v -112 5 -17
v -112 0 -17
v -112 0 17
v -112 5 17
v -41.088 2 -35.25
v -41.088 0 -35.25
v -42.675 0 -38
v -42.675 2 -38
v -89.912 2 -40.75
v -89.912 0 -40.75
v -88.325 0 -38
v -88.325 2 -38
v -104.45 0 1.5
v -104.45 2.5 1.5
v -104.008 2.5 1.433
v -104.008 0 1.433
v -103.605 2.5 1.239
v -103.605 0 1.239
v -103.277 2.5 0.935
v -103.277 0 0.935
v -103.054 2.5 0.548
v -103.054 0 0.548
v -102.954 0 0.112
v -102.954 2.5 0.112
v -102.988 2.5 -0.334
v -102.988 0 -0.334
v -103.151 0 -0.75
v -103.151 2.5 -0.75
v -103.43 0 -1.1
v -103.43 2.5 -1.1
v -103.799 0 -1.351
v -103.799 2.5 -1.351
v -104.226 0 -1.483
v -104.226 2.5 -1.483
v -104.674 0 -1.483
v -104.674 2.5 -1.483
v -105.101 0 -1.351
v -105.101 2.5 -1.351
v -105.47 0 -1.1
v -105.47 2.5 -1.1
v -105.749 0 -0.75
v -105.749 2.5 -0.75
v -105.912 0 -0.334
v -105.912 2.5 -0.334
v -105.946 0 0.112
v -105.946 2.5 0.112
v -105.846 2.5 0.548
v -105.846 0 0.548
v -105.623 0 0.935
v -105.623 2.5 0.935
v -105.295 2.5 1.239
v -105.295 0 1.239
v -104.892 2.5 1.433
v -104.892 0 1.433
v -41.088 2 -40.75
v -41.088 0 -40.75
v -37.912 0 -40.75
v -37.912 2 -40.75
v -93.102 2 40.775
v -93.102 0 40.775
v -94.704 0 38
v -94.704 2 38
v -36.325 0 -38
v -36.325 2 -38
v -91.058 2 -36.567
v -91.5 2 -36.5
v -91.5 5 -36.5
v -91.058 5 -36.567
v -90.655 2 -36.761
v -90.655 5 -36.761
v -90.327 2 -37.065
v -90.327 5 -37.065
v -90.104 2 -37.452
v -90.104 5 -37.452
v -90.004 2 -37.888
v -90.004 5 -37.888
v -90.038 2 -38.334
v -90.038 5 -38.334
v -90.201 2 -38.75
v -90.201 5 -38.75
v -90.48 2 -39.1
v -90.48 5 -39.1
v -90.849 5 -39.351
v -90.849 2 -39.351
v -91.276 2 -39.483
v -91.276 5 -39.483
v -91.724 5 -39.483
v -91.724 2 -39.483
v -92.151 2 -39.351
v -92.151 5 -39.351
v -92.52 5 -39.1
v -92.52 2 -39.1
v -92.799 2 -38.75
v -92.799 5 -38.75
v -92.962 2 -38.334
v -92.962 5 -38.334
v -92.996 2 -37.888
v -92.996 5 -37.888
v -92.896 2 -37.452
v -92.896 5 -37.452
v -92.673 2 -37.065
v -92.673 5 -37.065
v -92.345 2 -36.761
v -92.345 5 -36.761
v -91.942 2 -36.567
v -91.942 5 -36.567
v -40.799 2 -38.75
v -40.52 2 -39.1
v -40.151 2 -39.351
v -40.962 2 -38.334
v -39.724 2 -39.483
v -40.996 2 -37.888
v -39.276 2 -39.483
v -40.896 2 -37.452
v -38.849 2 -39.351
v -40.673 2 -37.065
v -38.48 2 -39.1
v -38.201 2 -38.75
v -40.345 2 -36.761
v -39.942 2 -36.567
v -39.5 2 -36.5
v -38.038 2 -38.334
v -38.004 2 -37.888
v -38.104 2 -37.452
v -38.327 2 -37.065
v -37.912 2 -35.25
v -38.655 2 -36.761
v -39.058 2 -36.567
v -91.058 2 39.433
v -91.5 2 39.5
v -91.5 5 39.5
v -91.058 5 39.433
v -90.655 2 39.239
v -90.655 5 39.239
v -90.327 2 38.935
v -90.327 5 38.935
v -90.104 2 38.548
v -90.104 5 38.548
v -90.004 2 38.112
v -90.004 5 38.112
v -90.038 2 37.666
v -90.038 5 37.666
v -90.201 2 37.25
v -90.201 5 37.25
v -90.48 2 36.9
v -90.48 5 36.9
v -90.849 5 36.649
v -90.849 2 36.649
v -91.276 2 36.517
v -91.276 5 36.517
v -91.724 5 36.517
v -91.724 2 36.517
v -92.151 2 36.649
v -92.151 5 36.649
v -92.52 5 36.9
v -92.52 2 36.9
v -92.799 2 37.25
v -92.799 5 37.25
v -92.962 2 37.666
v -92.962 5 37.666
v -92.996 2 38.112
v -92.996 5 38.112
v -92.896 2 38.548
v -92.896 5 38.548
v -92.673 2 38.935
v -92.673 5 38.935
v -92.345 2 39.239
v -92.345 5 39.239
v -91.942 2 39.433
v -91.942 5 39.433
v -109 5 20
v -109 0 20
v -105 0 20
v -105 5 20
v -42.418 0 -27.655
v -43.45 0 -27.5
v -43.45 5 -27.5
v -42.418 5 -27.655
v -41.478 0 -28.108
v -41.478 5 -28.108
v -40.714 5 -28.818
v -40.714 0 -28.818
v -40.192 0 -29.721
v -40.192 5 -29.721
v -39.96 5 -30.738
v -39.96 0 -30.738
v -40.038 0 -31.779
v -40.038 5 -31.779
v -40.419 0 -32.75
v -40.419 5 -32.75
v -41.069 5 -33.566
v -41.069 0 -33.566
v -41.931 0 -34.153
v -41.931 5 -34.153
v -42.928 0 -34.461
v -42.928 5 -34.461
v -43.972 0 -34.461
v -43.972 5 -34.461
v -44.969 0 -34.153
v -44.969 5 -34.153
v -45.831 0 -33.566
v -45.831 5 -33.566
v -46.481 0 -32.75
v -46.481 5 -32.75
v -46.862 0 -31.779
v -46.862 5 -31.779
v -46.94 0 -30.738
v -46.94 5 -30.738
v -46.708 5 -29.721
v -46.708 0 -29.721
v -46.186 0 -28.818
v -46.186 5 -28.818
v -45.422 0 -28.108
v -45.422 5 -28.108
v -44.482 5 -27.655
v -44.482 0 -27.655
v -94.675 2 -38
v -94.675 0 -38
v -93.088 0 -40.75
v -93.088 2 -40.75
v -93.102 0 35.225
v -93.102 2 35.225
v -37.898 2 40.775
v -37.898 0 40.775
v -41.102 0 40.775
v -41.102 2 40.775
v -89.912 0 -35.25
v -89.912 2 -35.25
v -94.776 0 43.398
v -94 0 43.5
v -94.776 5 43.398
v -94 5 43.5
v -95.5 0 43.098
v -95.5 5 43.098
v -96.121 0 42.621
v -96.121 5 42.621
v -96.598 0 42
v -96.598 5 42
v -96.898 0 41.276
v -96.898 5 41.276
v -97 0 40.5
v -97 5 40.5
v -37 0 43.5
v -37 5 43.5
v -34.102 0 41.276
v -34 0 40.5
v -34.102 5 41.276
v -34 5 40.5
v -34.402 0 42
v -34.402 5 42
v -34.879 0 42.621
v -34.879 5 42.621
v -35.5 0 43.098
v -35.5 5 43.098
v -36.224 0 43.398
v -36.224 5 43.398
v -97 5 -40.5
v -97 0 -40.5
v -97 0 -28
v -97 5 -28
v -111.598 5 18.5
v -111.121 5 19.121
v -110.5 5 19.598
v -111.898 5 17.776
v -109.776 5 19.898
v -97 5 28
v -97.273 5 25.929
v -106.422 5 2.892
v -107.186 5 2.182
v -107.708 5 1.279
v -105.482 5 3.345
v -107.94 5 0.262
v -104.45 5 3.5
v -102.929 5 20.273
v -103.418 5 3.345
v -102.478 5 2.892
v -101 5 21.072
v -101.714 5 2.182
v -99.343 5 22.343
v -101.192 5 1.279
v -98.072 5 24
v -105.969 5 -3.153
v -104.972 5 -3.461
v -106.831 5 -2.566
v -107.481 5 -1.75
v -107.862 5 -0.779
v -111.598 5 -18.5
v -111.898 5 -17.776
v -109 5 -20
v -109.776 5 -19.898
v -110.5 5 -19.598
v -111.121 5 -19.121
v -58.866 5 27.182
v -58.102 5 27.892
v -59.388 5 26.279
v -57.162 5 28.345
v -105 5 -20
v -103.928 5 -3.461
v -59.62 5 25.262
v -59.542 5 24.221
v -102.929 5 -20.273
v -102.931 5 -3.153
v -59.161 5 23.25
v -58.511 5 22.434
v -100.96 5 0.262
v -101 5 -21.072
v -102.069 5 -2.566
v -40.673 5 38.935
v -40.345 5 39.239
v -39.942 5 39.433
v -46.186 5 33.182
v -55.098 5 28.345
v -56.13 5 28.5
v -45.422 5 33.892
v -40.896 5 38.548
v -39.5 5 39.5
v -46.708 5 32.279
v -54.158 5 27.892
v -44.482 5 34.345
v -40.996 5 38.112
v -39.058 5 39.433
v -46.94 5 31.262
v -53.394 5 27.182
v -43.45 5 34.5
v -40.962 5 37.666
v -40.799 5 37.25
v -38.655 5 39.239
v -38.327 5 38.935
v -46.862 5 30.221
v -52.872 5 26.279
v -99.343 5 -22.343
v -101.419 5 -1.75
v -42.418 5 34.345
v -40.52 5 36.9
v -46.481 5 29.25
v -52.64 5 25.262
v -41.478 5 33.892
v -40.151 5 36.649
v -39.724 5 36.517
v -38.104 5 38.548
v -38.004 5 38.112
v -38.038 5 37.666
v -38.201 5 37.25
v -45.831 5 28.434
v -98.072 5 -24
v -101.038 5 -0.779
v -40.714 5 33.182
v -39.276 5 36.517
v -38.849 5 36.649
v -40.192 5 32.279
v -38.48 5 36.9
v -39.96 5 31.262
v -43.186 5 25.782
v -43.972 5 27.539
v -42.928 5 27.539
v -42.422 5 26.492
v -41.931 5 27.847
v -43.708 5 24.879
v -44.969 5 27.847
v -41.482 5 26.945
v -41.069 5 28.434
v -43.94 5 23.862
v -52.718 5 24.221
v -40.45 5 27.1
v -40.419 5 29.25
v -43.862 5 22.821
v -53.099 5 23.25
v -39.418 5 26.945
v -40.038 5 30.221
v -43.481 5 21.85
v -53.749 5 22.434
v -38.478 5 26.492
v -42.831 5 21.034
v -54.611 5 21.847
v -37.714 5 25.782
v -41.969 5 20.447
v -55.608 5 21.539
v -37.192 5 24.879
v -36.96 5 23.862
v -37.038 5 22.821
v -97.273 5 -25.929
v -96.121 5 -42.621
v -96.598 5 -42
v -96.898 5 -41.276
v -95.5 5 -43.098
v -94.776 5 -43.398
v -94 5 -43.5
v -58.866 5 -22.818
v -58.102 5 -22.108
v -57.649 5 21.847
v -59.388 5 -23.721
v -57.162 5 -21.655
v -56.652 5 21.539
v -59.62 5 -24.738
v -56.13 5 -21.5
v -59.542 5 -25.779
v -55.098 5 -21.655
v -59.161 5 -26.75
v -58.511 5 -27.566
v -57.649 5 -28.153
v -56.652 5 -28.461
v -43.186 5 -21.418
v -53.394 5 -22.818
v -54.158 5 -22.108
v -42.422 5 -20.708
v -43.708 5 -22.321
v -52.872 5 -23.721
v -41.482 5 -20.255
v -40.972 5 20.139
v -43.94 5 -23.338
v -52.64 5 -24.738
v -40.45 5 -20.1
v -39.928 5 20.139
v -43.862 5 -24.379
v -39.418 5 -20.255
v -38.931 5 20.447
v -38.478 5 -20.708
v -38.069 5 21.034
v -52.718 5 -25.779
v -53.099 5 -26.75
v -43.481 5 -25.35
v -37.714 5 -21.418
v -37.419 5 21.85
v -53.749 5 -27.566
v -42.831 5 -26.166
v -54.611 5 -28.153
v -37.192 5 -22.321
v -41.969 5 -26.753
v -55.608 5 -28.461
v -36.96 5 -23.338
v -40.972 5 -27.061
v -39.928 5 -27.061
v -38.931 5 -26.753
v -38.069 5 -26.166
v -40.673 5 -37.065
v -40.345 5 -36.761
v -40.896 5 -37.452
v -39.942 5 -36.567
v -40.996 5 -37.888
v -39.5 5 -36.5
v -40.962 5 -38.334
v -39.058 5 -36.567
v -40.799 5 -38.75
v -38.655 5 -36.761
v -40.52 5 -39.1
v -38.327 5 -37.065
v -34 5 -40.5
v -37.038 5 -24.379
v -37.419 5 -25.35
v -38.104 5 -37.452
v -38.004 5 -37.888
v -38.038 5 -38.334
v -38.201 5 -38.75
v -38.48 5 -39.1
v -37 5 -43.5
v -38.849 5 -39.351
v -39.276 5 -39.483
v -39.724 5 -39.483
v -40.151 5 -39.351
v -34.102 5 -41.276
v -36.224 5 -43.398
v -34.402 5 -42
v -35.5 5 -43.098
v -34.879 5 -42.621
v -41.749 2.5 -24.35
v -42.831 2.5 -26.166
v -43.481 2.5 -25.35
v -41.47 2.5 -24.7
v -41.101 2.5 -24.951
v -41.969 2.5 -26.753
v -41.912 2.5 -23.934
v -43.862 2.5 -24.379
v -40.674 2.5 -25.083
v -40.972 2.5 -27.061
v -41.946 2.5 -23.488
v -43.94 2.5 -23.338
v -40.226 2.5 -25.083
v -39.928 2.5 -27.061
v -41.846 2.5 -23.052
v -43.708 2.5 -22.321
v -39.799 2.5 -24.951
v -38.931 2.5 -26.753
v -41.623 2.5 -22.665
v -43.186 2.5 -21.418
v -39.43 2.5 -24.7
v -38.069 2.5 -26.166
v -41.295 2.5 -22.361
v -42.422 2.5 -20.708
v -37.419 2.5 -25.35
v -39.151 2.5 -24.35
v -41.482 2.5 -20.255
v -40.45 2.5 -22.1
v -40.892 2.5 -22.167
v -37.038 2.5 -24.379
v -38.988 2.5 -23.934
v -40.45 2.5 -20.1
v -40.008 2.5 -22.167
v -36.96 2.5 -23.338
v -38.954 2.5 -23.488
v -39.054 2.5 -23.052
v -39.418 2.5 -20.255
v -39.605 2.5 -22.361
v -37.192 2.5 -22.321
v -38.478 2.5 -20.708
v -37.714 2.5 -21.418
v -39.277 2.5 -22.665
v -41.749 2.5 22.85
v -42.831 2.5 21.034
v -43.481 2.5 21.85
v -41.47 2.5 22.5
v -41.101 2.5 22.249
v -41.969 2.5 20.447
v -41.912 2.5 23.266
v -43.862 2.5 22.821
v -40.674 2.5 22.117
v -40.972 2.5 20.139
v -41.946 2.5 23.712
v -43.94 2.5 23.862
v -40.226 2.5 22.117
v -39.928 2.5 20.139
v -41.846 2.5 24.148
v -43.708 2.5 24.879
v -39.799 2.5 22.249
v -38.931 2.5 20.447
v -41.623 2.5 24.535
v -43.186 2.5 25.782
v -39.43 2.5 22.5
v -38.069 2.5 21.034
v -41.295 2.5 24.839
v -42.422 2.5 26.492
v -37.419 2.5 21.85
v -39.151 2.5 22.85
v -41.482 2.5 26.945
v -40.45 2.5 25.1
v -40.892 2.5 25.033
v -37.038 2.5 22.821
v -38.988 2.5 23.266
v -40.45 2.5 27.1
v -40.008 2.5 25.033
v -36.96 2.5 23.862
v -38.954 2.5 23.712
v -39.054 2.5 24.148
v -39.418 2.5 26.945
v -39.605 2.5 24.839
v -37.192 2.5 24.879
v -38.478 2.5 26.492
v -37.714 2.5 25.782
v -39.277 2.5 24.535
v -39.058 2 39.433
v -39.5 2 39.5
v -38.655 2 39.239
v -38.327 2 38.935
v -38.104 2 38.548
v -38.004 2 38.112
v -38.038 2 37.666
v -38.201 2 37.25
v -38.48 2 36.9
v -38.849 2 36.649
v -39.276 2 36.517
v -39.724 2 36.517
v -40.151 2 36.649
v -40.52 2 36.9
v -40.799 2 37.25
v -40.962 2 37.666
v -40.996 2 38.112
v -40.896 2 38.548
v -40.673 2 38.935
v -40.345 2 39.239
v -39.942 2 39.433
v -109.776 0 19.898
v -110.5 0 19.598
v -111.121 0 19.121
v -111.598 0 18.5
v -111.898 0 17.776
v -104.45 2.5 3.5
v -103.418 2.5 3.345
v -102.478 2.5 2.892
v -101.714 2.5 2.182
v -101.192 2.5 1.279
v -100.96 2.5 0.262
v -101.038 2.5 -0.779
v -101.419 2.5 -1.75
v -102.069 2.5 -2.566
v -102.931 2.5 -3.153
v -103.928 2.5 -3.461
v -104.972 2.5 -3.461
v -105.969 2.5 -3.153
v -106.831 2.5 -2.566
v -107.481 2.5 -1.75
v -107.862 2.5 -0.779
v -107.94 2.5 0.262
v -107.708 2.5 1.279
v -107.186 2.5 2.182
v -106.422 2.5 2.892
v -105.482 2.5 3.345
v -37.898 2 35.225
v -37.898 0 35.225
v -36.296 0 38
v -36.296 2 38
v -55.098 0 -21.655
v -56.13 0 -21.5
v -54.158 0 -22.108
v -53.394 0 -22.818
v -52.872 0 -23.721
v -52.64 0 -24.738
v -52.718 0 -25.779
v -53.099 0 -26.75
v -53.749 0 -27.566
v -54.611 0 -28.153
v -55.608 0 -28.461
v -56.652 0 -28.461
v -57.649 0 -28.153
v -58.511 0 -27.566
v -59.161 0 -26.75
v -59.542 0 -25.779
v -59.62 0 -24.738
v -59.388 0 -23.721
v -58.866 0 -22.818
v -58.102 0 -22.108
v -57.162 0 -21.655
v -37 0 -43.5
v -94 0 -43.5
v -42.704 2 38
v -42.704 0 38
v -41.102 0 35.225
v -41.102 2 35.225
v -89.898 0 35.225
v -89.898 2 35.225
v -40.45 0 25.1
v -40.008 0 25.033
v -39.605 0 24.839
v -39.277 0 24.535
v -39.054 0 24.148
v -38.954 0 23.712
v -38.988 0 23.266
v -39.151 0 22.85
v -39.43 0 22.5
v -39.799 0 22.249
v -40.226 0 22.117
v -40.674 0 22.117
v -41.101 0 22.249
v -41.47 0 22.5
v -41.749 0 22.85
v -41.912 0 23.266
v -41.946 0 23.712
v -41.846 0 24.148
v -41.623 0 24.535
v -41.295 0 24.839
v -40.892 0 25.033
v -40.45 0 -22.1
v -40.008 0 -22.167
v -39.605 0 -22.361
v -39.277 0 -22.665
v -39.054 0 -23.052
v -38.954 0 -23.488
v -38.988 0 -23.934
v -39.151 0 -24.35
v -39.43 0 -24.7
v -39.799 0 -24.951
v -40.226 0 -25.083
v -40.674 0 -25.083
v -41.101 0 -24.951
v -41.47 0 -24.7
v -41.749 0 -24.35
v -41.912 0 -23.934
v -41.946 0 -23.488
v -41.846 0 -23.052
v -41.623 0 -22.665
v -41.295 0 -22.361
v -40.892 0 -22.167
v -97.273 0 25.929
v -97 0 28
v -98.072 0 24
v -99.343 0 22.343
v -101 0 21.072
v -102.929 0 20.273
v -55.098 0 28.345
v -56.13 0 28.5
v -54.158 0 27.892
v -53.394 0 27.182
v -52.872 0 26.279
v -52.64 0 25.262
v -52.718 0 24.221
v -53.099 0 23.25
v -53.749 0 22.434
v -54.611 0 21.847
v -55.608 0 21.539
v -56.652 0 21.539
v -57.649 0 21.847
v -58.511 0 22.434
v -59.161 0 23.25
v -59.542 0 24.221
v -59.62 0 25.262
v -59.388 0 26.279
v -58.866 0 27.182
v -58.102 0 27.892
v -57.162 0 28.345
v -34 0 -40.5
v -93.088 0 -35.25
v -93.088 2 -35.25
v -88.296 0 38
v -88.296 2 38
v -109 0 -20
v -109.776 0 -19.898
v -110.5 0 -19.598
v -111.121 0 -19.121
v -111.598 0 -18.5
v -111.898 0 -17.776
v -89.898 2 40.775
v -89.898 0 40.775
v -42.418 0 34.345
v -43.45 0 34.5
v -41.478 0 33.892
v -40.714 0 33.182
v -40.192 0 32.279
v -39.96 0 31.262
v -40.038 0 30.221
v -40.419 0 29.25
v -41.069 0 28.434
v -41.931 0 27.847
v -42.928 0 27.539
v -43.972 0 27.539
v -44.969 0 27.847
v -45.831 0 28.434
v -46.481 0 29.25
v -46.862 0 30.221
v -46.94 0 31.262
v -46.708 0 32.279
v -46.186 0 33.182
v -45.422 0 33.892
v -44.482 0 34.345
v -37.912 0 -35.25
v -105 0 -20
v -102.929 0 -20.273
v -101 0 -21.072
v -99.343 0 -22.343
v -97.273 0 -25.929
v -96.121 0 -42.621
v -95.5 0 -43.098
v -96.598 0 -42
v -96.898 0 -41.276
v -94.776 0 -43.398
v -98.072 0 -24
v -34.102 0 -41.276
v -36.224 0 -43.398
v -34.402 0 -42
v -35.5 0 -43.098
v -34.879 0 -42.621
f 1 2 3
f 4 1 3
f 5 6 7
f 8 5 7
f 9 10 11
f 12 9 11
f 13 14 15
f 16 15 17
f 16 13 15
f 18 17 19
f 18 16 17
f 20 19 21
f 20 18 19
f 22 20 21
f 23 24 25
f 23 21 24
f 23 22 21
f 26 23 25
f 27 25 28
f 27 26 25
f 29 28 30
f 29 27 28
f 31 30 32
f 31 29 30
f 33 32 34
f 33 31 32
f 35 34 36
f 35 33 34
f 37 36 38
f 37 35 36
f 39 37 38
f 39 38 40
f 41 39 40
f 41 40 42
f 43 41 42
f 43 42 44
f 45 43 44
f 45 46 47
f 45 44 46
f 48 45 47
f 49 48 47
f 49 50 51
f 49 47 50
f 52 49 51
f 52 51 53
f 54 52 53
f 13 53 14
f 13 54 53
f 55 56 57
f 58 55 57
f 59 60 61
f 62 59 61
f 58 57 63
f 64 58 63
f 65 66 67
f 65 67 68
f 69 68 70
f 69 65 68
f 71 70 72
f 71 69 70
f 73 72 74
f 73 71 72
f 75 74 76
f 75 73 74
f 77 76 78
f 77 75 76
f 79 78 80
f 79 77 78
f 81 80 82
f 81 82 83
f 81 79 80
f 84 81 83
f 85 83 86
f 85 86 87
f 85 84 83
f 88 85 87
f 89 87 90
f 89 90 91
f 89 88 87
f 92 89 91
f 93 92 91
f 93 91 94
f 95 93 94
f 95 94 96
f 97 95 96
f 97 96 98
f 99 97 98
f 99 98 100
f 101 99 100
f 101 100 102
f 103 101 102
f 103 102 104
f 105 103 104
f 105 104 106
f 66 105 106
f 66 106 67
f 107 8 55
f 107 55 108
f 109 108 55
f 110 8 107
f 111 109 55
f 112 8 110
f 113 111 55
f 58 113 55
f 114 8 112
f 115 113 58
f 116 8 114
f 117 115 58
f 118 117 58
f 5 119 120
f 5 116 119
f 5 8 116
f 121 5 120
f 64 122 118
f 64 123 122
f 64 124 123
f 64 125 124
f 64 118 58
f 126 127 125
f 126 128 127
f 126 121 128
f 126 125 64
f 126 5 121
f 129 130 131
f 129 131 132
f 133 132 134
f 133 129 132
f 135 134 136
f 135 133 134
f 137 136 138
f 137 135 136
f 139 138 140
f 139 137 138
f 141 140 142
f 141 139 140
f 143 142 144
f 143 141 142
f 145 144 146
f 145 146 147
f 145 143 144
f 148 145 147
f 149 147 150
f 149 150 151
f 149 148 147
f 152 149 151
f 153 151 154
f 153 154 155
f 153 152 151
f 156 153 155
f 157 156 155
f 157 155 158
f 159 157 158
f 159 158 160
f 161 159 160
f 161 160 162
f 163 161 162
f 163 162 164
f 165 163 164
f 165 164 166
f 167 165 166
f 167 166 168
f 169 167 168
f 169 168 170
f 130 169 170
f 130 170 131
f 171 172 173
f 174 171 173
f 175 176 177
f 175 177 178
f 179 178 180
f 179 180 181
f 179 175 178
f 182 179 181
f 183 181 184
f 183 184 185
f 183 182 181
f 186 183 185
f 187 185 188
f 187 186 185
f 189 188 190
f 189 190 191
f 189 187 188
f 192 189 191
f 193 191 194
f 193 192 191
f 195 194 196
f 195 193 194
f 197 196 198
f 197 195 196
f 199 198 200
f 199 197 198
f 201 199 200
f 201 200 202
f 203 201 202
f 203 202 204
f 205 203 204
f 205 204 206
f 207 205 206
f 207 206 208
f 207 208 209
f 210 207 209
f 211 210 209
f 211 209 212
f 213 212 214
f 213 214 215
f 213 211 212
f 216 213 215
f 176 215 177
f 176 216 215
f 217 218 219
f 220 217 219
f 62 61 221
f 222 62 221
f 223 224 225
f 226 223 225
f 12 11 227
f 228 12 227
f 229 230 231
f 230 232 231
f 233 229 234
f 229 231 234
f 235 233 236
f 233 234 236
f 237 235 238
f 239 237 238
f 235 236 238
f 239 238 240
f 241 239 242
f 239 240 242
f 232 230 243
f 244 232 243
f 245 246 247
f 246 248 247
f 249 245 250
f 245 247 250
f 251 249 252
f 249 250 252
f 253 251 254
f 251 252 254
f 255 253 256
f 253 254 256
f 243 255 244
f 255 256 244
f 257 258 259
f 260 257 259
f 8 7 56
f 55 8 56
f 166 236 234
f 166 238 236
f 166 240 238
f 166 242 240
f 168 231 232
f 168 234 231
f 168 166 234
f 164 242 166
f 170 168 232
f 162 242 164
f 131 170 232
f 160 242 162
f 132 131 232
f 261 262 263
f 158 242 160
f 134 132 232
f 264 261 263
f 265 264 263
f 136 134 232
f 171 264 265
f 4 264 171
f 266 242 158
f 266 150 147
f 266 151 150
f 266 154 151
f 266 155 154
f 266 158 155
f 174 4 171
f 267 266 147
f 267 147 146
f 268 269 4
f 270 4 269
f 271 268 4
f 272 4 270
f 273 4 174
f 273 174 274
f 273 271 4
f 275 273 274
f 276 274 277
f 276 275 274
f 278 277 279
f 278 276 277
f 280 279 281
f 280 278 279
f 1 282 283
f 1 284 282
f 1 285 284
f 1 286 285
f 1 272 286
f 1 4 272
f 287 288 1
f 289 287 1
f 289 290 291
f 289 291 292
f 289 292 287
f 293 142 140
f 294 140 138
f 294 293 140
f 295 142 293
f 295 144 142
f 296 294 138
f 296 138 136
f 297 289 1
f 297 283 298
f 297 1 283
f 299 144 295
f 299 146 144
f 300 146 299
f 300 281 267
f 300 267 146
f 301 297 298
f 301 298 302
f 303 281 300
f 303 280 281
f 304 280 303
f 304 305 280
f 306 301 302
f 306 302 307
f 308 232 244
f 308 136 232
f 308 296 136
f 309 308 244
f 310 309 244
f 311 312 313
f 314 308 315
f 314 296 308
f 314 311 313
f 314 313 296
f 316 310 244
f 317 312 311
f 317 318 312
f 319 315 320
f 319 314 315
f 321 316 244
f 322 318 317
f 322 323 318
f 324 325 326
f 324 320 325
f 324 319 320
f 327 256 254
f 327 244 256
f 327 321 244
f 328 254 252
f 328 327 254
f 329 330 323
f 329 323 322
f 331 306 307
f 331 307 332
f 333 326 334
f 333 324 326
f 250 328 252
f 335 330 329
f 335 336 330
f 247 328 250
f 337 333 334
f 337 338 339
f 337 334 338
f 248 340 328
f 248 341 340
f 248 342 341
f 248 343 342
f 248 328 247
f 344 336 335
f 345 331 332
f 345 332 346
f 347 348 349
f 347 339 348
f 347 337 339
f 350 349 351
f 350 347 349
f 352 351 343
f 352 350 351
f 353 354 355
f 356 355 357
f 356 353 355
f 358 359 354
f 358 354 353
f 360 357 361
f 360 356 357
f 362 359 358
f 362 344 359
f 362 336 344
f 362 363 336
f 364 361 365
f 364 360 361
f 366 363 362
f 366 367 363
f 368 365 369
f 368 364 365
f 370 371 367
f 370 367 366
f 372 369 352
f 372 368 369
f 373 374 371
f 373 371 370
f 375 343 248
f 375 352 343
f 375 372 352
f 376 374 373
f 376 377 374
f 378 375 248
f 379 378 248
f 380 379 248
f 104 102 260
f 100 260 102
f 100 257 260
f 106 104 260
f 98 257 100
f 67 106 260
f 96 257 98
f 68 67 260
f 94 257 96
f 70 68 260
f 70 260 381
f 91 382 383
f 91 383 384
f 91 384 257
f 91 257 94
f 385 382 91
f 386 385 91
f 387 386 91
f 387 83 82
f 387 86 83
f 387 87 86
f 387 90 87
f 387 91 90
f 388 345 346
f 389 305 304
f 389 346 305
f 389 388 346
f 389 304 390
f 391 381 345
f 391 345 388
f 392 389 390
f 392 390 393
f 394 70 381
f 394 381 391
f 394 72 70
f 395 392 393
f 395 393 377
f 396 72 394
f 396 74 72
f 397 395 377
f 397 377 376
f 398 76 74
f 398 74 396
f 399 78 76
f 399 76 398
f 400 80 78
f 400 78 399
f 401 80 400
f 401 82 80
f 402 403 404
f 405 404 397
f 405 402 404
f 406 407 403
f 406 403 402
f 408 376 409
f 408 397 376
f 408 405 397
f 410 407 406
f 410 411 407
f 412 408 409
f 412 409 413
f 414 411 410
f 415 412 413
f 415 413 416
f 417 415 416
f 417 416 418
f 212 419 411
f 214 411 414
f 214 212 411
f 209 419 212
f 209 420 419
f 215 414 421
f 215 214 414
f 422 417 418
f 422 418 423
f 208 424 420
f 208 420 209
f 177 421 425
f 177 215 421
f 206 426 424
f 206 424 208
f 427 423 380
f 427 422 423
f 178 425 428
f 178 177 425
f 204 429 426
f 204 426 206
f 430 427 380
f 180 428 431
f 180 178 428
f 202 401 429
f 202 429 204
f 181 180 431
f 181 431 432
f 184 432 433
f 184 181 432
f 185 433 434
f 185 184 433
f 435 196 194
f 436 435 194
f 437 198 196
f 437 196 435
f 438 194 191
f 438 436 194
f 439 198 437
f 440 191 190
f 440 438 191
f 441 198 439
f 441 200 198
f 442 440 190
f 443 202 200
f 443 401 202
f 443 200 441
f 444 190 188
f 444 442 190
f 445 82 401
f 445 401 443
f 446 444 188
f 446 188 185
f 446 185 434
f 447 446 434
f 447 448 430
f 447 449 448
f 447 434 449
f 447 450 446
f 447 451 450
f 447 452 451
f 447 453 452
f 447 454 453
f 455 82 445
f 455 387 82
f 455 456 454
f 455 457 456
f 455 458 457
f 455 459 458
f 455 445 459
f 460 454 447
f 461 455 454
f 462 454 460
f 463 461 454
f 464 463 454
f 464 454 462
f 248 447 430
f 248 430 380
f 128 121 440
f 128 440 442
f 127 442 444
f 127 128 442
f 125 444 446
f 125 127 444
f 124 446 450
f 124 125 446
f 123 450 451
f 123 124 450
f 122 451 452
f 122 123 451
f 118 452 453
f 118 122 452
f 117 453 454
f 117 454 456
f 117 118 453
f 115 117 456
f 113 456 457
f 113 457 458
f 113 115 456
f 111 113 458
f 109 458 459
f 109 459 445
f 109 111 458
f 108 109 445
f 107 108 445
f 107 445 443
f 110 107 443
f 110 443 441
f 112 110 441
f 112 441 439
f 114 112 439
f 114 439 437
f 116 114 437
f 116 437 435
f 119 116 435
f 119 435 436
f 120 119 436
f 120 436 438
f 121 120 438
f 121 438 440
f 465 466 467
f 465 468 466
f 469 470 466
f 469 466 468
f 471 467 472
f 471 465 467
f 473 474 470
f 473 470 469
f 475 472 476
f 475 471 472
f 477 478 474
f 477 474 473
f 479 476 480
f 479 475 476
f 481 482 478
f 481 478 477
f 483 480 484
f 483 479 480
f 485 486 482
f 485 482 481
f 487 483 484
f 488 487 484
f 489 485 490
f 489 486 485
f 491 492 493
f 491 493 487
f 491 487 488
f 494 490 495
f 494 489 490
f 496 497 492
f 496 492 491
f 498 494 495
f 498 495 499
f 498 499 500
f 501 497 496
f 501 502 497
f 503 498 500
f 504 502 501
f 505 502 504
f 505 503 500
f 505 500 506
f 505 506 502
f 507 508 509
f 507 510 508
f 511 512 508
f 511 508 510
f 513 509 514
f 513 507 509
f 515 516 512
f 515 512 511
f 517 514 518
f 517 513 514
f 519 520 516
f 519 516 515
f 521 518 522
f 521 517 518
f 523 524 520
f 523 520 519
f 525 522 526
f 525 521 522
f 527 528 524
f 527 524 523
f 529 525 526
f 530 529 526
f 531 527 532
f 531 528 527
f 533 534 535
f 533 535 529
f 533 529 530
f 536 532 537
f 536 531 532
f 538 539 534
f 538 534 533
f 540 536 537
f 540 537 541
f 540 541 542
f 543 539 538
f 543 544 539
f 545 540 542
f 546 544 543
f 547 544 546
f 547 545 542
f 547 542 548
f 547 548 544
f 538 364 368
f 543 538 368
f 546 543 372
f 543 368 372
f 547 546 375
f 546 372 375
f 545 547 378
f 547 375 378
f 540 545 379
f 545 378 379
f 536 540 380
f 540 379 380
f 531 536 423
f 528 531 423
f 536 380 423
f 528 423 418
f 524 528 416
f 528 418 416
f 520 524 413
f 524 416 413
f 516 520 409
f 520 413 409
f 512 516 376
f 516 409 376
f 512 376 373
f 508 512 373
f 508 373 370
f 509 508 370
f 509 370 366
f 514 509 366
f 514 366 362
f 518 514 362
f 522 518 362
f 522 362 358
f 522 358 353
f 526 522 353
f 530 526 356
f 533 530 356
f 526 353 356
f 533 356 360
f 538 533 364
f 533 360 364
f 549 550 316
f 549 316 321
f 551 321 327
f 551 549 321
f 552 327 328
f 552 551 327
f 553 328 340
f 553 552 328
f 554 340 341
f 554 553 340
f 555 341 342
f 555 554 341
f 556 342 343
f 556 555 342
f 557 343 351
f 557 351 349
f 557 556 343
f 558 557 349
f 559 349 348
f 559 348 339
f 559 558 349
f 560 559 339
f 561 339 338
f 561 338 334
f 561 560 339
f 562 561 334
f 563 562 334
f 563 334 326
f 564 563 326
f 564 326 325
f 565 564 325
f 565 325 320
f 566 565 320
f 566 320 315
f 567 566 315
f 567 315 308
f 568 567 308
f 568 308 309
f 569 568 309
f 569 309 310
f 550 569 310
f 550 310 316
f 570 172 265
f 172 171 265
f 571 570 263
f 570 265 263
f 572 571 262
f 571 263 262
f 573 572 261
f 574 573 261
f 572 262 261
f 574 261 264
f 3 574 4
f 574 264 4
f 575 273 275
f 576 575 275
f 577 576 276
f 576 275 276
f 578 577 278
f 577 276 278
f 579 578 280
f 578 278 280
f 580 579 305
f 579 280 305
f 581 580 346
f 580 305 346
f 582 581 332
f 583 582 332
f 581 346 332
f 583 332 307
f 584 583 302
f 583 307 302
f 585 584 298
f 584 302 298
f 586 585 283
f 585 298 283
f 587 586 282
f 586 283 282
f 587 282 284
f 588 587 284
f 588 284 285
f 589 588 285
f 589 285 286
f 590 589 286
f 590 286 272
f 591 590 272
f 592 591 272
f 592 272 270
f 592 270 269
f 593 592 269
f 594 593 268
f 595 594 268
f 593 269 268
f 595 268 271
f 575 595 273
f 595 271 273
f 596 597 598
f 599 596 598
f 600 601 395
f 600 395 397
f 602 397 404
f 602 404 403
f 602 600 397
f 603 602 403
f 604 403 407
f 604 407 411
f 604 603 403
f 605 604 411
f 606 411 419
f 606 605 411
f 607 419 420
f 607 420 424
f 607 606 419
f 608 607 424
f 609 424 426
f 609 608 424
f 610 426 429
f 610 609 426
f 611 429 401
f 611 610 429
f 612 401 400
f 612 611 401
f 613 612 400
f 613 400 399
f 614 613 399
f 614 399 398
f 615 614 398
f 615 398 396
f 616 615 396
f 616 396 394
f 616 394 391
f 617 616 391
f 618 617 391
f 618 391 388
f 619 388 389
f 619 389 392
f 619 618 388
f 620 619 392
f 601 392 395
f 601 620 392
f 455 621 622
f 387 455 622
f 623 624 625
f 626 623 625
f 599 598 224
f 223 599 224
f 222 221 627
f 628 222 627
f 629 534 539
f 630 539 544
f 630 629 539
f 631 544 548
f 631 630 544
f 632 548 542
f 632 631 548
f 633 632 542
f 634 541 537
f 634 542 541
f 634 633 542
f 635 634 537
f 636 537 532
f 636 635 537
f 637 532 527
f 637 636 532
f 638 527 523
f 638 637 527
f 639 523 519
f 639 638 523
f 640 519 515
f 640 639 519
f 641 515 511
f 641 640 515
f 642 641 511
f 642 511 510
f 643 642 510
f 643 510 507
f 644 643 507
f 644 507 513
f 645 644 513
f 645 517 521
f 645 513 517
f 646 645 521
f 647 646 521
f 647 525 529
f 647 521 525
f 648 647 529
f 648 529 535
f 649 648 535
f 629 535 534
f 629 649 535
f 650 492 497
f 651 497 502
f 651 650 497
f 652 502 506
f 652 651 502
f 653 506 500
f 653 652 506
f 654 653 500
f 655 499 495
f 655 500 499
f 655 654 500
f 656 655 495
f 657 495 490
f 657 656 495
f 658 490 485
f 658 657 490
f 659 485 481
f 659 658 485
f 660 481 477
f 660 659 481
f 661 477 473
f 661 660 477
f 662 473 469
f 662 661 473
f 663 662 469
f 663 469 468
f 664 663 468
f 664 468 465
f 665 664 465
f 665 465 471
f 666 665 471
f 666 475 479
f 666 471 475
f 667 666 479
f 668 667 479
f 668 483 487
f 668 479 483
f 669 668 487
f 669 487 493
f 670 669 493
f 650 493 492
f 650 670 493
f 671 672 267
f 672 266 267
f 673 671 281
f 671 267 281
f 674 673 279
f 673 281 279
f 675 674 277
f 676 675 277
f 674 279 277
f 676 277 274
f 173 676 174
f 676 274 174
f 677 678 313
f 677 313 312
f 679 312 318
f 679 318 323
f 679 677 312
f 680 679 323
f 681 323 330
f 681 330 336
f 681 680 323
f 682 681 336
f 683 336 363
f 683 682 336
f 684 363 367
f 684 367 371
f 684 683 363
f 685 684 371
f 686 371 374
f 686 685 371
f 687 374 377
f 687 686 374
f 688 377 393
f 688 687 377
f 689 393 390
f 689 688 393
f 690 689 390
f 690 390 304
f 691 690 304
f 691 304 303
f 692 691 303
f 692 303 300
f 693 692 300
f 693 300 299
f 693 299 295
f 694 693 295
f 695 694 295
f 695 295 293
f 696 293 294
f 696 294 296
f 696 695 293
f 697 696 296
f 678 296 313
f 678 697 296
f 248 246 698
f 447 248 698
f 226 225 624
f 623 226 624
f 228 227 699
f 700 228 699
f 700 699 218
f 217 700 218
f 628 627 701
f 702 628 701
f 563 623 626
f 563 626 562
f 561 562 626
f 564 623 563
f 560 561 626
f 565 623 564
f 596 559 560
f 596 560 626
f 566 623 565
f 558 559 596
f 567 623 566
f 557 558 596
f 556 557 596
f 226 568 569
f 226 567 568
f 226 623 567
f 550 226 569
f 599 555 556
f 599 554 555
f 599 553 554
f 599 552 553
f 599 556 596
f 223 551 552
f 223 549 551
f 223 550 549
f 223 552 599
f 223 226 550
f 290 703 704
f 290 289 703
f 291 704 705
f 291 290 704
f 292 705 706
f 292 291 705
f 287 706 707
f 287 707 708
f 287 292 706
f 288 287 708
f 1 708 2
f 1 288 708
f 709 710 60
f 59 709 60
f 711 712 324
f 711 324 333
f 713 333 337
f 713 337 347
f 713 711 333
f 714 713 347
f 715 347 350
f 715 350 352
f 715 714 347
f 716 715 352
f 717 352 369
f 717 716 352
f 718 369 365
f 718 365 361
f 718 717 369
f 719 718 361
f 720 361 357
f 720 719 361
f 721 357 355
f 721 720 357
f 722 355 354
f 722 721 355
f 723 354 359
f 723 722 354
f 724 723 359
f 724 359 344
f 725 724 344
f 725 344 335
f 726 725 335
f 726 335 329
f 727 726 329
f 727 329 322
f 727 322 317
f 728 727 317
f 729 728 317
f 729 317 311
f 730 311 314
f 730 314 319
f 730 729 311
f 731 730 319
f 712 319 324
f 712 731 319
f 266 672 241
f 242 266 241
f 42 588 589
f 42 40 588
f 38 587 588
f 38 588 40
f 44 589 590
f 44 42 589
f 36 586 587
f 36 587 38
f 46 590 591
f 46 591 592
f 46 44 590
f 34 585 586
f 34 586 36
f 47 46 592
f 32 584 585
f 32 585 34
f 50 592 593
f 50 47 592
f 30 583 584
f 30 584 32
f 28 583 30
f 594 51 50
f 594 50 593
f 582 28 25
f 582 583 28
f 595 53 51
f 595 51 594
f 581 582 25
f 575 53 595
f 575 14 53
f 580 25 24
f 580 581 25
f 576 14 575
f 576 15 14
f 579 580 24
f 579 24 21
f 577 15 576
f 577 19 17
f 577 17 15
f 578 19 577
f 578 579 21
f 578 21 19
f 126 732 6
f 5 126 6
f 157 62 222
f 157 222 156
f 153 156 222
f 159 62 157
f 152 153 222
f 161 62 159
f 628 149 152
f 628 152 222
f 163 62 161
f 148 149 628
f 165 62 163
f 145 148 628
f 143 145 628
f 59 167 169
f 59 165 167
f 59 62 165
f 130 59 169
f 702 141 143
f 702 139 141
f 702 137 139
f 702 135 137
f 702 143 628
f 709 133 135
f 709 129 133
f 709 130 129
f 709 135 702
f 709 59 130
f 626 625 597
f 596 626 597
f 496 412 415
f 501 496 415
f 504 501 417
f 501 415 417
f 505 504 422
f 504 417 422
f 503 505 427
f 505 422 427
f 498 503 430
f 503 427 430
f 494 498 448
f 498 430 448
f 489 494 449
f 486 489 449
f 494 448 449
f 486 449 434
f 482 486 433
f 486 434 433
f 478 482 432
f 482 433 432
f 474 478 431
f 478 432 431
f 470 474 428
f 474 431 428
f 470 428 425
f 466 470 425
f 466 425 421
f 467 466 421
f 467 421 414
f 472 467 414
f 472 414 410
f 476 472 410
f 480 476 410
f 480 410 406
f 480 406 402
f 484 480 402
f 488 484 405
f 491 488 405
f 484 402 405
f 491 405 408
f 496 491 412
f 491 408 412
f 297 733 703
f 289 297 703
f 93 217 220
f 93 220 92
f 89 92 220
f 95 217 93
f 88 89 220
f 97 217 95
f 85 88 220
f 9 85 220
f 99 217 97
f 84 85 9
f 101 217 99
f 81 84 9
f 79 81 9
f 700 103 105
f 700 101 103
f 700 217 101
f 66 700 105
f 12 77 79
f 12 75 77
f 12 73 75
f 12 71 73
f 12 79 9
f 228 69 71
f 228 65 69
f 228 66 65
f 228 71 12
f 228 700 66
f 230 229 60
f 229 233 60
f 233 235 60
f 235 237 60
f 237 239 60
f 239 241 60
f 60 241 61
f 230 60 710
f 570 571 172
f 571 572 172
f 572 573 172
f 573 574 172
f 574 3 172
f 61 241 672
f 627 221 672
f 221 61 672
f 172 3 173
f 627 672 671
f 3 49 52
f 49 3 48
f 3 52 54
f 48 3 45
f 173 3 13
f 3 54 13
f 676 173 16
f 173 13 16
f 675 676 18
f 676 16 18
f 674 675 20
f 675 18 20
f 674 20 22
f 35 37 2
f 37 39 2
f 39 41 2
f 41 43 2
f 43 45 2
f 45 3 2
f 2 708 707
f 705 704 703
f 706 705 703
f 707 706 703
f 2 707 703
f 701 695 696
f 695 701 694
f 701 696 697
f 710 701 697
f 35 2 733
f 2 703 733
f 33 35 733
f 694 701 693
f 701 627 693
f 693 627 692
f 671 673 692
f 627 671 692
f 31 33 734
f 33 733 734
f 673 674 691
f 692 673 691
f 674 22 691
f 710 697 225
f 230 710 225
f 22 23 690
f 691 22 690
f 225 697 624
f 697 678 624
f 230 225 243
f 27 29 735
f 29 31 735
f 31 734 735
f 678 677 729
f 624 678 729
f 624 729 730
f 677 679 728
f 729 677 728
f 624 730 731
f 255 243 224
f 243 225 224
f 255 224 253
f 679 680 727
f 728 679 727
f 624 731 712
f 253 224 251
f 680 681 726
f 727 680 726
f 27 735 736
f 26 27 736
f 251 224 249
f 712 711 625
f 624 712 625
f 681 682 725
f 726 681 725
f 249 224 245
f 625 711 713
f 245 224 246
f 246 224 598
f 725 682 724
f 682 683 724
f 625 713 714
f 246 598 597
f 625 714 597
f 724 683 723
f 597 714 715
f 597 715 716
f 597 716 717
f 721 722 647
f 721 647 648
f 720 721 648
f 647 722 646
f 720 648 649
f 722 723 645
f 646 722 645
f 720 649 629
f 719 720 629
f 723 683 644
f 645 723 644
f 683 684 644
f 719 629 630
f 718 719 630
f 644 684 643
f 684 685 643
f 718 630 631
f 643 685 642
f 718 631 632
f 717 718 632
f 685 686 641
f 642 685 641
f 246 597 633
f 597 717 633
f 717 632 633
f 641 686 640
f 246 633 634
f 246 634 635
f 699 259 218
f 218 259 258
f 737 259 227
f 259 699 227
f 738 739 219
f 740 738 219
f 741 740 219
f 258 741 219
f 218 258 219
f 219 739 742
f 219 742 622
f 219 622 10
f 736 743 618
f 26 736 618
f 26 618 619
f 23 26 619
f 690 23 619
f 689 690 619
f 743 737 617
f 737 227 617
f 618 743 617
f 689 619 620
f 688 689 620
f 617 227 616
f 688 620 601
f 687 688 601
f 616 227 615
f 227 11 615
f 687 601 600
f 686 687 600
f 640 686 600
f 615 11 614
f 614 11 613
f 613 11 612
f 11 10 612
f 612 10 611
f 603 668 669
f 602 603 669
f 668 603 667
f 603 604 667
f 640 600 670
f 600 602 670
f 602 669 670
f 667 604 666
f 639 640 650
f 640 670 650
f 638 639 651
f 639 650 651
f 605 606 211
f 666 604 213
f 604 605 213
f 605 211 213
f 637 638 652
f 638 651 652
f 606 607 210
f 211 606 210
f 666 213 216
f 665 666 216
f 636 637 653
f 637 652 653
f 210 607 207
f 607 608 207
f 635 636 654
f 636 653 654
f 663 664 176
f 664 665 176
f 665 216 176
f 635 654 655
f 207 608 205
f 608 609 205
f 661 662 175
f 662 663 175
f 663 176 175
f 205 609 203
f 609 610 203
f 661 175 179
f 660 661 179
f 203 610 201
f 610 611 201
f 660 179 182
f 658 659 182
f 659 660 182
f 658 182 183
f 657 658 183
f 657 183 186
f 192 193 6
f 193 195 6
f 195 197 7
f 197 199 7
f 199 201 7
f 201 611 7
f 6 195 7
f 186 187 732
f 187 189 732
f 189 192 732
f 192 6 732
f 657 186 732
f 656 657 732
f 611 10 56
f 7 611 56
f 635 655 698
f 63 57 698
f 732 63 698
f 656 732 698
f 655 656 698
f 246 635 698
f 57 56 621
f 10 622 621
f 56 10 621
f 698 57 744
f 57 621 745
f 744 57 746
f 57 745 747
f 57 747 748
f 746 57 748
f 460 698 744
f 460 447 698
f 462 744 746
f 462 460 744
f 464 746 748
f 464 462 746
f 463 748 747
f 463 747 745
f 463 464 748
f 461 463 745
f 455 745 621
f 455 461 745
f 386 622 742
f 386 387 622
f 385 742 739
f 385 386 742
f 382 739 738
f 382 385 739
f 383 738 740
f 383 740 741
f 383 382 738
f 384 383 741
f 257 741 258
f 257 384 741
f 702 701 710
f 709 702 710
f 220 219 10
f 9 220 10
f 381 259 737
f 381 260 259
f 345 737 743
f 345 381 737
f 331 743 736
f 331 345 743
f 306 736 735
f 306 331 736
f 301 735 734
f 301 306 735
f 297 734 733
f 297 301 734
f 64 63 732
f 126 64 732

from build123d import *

# Parameters (mm, degrees)
SKETCH1_R           = 1.5
SKETCH1_R_2         = 3.5
BOSS_EXTRUDE1_DEPTH = 5
FILLET1_R           = 3
FILLET2_R           = 8
SKETCH2_R           = 3.5
CUT_EXTRUDE1_DEPTH  = 2.5
CUT_EXTRUDE2_DEPTH  = 2


with BuildPart() as part:
    # Sketch1 → Boss-Extrude1 (new body)
    with BuildSketch(Plane(origin=(0, 0, 0), x_dir=(1, 0, 0), z_dir=(0, 1, 0))):
        Polygon((-34, -43.5), (-34, 43.5), (-97, 43.5), (-97, 20), (-112, 20), (-112, -20), (-97, -20), (-97, -43.5), align=None)
        with Locations(Location((-104.45, 0, 0), (0, 0, 270))):
            Circle(SKETCH1_R, mode=Mode.SUBTRACT)
        with Locations(Location((-43.45, 31, 0), (0, 0, 270))):
            Circle(SKETCH1_R_2, mode=Mode.SUBTRACT)
        with Locations(Location((-56.13, 25, 0), (0, 0, 270))):
            Circle(SKETCH1_R_2, mode=Mode.SUBTRACT)
        with Locations(Location((-40.45, 23.6, 0), (0, 0, 270))):
            Circle(SKETCH1_R, mode=Mode.SUBTRACT)
        with Locations(Location((-40.45, -23.6, 0), (0, 0, 270))):
            Circle(SKETCH1_R, mode=Mode.SUBTRACT)
        with Locations(Location((-56.13, -25, 0), (0, 0, 270))):
            Circle(SKETCH1_R_2, mode=Mode.SUBTRACT)
        with Locations(Location((-43.45, -31, 0), (0, 0, 270))):
            Circle(SKETCH1_R_2, mode=Mode.SUBTRACT)
        with Locations(Location((-39.5, 38, 0), (0, 0, 270))):
            Circle(SKETCH1_R, mode=Mode.SUBTRACT)
        with Locations(Location((-91.5, 38, 0), (0, 0, 270))):
            Circle(SKETCH1_R, mode=Mode.SUBTRACT)
        with Locations(Location((-91.5, -38, 0), (0, 0, 270))):
            Circle(SKETCH1_R, mode=Mode.SUBTRACT)
        with Locations(Location((-39.5, -38, 0), (0, 0, 270))):
            Circle(SKETCH1_R, mode=Mode.SUBTRACT)
    extrude(amount=BOSS_EXTRUDE1_DEPTH)

    # Fillet1
    fillet1_edges = [part.edges().sort_by_distance(p)[0] for p in [
        (-97, 2.5, 43.5),
        (-112, 2.5, 20),
        (-112, 2.5, -20),
        (-97, 2.5, -43.5),
        (-34, 2.5, -43.5),
        (-34, 2.5, 43.5),
    ]]
    fillet(fillet1_edges, radius=FILLET1_R)

    # Fillet2
    fillet2_edges = [part.edges().sort_by_distance(p)[0] for p in [
        (-97, 2.5, 20),
        (-97, 2.5, -20),
    ]]
    fillet(fillet2_edges, radius=FILLET2_R)

    # Sketch2 → Cut-Extrude1 (cut)
    with BuildSketch(Plane(origin=(0, 5, 0), x_dir=(1, 0, 0), z_dir=(0, 1, 0))):
        with Locations(Location((-40.45, -23.6, 0), (0, 0, 270))):
            Circle(SKETCH2_R)
        with Locations(Location((-40.45, 23.6, 0), (0, 0, 270))):
            Circle(SKETCH2_R)
        with Locations(Location((-104.45, 0, 0), (0, 0, 270))):
            Circle(SKETCH2_R)
    extrude(amount=-CUT_EXTRUDE1_DEPTH, mode=Mode.SUBTRACT)

    # Sketch3 → Cut-Extrude2 (cut)
    with BuildSketch(Plane.XZ):
        Polygon((-37.897853003, 35.225), (-36.295706006, 38), (-37.897853003, 40.775), (-41.102146997, 40.775), (-42.704293994, 38), (-41.102146997, 35.225), align=None)
        Polygon((-89.897853003, 35.225), (-88.295706006, 38), (-89.897853003, 40.775), (-93.102146997, 40.775), (-94.704293994, 38), (-93.102146997, 35.225), align=None)
        Polygon((-89.91228676, -35.25), (-93.08771324, -35.25), (-94.675426481, -38), (-93.08771324, -40.75), (-89.91228676, -40.75), (-88.324573519, -38), align=None)
        Polygon((-37.91228676, -40.75), (-36.324573519, -38), (-37.91228676, -35.25), (-41.08771324, -35.25), (-42.675426481, -38), (-41.08771324, -40.75), align=None)
    extrude(amount=-CUT_EXTRUDE2_DEPTH, mode=Mode.SUBTRACT)


solid = part.part
